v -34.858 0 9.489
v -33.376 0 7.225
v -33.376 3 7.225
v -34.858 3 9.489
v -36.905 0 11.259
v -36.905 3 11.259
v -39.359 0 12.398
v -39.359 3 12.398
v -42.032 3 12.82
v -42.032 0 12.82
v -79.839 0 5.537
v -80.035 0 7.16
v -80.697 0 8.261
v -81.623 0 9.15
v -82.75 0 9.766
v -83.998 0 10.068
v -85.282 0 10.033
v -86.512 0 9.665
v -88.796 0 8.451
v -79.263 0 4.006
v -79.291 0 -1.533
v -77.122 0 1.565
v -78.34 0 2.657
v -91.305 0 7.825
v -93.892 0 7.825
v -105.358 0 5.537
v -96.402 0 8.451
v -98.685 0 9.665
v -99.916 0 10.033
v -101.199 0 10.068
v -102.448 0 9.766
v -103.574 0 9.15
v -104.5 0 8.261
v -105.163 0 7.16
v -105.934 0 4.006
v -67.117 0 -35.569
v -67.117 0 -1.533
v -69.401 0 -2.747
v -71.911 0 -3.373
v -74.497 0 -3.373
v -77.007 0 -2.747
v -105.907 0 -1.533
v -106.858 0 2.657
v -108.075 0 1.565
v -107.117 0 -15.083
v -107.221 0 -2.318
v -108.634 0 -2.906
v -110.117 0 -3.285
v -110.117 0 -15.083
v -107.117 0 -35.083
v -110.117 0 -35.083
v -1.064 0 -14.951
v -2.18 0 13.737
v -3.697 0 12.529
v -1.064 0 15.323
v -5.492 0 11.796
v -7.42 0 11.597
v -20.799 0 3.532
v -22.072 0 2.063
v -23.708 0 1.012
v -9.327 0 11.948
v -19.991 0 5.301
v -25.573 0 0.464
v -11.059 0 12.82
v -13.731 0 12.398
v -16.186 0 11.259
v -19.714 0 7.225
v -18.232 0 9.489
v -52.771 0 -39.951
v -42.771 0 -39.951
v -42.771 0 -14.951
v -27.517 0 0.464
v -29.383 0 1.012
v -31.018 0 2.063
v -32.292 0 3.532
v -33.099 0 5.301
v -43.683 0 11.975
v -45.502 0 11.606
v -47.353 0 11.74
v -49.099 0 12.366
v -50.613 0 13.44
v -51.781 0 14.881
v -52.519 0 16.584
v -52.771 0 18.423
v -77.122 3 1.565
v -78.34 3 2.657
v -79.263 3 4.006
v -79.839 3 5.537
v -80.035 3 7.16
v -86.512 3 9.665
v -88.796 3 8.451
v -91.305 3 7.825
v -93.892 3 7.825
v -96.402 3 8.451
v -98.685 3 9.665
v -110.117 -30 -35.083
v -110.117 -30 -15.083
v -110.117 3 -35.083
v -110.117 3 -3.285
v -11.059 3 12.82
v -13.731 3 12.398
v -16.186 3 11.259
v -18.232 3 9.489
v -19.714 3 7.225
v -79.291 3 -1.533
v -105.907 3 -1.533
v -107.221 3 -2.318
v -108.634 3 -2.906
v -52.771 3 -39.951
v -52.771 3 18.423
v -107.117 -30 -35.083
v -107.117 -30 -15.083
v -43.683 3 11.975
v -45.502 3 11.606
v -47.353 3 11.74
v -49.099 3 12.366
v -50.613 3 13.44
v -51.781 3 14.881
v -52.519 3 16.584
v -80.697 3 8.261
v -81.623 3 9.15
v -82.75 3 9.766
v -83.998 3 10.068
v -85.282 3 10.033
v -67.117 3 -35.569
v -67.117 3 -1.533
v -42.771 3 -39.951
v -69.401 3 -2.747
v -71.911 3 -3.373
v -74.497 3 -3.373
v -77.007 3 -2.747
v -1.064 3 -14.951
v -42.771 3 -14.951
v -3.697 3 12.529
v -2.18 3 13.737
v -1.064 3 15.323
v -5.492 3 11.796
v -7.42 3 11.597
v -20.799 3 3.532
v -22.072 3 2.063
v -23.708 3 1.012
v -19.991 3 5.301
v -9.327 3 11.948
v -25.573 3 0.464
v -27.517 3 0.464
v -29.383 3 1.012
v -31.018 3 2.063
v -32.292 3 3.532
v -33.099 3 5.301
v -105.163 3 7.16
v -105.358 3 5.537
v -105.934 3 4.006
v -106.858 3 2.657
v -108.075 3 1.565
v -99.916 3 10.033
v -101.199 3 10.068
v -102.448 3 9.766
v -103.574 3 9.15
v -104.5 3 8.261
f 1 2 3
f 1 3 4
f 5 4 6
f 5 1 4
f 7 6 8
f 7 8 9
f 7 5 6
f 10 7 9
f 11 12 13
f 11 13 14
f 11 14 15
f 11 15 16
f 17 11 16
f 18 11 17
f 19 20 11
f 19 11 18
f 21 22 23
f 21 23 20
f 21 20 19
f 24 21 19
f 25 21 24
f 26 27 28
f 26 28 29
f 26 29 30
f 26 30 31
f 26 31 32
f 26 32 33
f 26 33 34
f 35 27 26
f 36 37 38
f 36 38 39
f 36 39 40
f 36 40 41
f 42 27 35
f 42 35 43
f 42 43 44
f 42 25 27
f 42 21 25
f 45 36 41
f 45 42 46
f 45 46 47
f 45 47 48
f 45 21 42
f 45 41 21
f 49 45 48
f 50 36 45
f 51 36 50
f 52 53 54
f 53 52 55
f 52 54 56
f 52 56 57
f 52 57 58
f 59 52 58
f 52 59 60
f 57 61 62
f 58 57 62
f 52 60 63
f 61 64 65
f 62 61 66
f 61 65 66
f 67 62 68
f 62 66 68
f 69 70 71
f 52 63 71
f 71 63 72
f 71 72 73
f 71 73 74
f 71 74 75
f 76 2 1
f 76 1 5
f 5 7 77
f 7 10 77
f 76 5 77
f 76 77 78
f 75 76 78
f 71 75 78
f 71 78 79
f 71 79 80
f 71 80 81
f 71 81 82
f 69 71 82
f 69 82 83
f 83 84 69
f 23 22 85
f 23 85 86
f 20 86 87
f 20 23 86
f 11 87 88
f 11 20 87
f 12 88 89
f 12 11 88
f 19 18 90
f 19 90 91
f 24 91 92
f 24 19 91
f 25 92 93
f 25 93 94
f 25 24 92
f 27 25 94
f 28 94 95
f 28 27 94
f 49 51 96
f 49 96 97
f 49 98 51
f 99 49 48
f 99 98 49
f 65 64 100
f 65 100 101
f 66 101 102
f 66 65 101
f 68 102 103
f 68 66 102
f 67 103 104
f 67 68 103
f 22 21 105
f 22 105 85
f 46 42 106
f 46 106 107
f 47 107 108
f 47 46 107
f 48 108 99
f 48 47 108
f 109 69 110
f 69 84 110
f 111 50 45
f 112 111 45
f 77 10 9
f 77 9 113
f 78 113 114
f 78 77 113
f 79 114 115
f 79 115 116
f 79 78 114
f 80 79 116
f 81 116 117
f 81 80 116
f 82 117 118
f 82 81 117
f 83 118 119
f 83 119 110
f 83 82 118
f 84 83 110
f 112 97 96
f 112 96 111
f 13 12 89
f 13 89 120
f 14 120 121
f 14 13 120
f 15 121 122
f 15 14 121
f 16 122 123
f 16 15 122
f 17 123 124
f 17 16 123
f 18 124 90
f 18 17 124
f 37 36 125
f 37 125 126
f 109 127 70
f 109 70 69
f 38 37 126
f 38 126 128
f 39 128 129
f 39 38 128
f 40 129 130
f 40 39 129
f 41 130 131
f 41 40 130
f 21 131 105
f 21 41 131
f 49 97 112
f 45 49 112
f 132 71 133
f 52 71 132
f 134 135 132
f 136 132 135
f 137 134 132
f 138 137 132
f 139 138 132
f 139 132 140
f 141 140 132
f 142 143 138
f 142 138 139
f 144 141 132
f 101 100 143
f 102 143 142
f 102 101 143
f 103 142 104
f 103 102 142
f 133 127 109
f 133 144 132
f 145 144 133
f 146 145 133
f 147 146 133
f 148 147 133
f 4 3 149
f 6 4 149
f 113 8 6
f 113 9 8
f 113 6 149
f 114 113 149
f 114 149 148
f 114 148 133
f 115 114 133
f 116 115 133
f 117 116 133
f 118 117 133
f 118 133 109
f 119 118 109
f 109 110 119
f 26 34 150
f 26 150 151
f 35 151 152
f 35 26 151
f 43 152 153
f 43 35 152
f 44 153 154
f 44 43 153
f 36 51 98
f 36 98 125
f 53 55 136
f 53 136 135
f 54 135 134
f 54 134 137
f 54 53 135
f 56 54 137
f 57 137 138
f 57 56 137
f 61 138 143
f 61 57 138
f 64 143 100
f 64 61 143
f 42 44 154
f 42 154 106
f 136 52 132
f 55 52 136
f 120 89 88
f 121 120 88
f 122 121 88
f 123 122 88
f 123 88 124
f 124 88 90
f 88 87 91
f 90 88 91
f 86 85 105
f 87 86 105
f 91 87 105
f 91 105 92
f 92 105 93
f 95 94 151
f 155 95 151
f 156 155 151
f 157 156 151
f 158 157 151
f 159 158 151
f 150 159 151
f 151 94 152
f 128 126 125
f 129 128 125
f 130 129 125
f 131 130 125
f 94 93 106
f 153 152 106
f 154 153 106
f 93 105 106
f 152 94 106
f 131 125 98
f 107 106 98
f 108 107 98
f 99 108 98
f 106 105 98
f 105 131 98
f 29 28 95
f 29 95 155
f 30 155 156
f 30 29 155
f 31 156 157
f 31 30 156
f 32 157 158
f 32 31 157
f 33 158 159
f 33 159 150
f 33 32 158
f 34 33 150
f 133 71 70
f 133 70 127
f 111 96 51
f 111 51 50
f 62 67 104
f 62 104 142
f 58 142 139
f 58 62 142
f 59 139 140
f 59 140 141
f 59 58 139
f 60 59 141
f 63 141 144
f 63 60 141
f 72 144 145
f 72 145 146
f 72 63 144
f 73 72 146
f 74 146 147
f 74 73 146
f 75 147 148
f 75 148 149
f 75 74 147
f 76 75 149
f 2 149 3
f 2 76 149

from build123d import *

# Parameters (mm, degrees)
BOSS_EXTRUDE1_DEPTH   = 3
BOSS_EXTRUDE1_2_DEPTH = 3
SKETCH3_W             = 10
SKETCH3_H             = 3
BOSS_EXTRUDE2_DEPTH   = 25
SKETCH4_W             = 3
SKETCH4_H             = 20
BOSS_EXTRUDE3_DEPTH   = 30


with BuildPart() as part:
    # Sketch1 → Boss-Extrude1 (new body)
    with BuildSketch(Plane(origin=(0, 0, 0), x_dir=(1, 0, 0), z_dir=(0, 1, 0))):
        with BuildLine():
            Line((-108.075427433, -1.564939748), (-105.906554588, 1.532531683))
            ThreePointArc((-105.906554588, 1.532531683), (-107.916571134, 2.63736717), (-110.11703504, 3.284504381))
            Line((-110.11703504, 3.284504381), (-110.11703504, 15.083193879))
            Line((-110.11703504, 15.083193879), (-110.11703504, 35.083193879))
            Line((-110.11703504, 35.083193879), (-67.11703504, 35.569089871))
            Line((-67.11703504, 35.569089871), (-67.11703504, 15.01520735))
            Line((-67.11703504, 15.01520735), (-67.11703504, 1.532531683))
            ThreePointArc((-67.11703504, 1.532531683), (-73.203871736, 3.451703921), (-79.290708431, 1.532531683))
            Line((-79.290708431, 1.532531683), (-77.121835585, -1.564939748))
            ThreePointArc((-77.121835585, -1.564939748), (-79.262831202, -4.006277352), (-80.034633255, -7.16037201))
            ThreePointArc((-80.034633255, -7.16037201), (-82.749732839, -9.766447293), (-86.511794814, -9.665038093))
            ThreePointArc((-86.511794814, -9.665038093), (-92.598631509, -7.745865855), (-98.685468204, -9.665038093))
            ThreePointArc((-98.685468204, -9.665038093), (-102.447530179, -9.766447293), (-105.162629764, -7.16037201))
            ThreePointArc((-105.162629764, -7.16037201), (-105.934431817, -4.006277352), (-108.075427433, -1.564939748))
        make_face()
    extrude(amount=BOSS_EXTRUDE1_DEPTH)

    # Sketch4 → Boss-Extrude3 (add)
    with BuildSketch(Plane.XZ):
        with Locations((-108.61703504, -25.083193879)):
            Rectangle(SKETCH4_W, SKETCH4_H)
    extrude(amount=BOSS_EXTRUDE3_DEPTH)


with BuildPart() as body_2:
    # Sketch1 → Boss-Extrude1 2 (new body)
    with BuildSketch(Plane(origin=(0, 0, 0), x_dir=(1, 0, 0), z_dir=(0, 1, 0))):
        with BuildLine():
            Line((-52.770658442, -18.42256832), (-52.770658442, 14.950580817))
            Line((-52.770658442, 14.950580817), (-1.06354068, 14.950580817))
            Line((-1.06354068, 14.950580817), (-1.06354068, -15.322613163))
            ThreePointArc((-1.06354068, -15.322613163), (-5.491565113, -11.796283931), (-11.058747651, -12.820430807))
            ThreePointArc((-11.058747651, -12.820430807), (-16.18555762, -11.25868924), (-19.71437563, -7.224998544))
            ThreePointArc((-19.71437563, -7.224998544), (-26.545137149, -0.394237025), (-33.375898669, -7.224998544))
            ThreePointArc((-33.375898669, -7.224998544), (-36.904716678, -11.25868924), (-42.031526647, -12.820430807))
            ThreePointArc((-42.031526647, -12.820430807), (-49.099181466, -12.366313363), (-52.770658442, -18.42256832))
        make_face()
    extrude(amount=BOSS_EXTRUDE1_2_DEPTH)

    # Sketch3 → Boss-Extrude2 (add)
    with BuildSketch(Plane(origin=(0, 0, -14.950580817), x_dir=(-1, 0, 0), z_dir=(0, 0, -1))):
        with Locations((47.770658442, 1.5)):
            Rectangle(SKETCH3_W, SKETCH3_H)
    extrude(amount=BOSS_EXTRUDE2_DEPTH)


solid = Compound([part.part, body_2.part])
